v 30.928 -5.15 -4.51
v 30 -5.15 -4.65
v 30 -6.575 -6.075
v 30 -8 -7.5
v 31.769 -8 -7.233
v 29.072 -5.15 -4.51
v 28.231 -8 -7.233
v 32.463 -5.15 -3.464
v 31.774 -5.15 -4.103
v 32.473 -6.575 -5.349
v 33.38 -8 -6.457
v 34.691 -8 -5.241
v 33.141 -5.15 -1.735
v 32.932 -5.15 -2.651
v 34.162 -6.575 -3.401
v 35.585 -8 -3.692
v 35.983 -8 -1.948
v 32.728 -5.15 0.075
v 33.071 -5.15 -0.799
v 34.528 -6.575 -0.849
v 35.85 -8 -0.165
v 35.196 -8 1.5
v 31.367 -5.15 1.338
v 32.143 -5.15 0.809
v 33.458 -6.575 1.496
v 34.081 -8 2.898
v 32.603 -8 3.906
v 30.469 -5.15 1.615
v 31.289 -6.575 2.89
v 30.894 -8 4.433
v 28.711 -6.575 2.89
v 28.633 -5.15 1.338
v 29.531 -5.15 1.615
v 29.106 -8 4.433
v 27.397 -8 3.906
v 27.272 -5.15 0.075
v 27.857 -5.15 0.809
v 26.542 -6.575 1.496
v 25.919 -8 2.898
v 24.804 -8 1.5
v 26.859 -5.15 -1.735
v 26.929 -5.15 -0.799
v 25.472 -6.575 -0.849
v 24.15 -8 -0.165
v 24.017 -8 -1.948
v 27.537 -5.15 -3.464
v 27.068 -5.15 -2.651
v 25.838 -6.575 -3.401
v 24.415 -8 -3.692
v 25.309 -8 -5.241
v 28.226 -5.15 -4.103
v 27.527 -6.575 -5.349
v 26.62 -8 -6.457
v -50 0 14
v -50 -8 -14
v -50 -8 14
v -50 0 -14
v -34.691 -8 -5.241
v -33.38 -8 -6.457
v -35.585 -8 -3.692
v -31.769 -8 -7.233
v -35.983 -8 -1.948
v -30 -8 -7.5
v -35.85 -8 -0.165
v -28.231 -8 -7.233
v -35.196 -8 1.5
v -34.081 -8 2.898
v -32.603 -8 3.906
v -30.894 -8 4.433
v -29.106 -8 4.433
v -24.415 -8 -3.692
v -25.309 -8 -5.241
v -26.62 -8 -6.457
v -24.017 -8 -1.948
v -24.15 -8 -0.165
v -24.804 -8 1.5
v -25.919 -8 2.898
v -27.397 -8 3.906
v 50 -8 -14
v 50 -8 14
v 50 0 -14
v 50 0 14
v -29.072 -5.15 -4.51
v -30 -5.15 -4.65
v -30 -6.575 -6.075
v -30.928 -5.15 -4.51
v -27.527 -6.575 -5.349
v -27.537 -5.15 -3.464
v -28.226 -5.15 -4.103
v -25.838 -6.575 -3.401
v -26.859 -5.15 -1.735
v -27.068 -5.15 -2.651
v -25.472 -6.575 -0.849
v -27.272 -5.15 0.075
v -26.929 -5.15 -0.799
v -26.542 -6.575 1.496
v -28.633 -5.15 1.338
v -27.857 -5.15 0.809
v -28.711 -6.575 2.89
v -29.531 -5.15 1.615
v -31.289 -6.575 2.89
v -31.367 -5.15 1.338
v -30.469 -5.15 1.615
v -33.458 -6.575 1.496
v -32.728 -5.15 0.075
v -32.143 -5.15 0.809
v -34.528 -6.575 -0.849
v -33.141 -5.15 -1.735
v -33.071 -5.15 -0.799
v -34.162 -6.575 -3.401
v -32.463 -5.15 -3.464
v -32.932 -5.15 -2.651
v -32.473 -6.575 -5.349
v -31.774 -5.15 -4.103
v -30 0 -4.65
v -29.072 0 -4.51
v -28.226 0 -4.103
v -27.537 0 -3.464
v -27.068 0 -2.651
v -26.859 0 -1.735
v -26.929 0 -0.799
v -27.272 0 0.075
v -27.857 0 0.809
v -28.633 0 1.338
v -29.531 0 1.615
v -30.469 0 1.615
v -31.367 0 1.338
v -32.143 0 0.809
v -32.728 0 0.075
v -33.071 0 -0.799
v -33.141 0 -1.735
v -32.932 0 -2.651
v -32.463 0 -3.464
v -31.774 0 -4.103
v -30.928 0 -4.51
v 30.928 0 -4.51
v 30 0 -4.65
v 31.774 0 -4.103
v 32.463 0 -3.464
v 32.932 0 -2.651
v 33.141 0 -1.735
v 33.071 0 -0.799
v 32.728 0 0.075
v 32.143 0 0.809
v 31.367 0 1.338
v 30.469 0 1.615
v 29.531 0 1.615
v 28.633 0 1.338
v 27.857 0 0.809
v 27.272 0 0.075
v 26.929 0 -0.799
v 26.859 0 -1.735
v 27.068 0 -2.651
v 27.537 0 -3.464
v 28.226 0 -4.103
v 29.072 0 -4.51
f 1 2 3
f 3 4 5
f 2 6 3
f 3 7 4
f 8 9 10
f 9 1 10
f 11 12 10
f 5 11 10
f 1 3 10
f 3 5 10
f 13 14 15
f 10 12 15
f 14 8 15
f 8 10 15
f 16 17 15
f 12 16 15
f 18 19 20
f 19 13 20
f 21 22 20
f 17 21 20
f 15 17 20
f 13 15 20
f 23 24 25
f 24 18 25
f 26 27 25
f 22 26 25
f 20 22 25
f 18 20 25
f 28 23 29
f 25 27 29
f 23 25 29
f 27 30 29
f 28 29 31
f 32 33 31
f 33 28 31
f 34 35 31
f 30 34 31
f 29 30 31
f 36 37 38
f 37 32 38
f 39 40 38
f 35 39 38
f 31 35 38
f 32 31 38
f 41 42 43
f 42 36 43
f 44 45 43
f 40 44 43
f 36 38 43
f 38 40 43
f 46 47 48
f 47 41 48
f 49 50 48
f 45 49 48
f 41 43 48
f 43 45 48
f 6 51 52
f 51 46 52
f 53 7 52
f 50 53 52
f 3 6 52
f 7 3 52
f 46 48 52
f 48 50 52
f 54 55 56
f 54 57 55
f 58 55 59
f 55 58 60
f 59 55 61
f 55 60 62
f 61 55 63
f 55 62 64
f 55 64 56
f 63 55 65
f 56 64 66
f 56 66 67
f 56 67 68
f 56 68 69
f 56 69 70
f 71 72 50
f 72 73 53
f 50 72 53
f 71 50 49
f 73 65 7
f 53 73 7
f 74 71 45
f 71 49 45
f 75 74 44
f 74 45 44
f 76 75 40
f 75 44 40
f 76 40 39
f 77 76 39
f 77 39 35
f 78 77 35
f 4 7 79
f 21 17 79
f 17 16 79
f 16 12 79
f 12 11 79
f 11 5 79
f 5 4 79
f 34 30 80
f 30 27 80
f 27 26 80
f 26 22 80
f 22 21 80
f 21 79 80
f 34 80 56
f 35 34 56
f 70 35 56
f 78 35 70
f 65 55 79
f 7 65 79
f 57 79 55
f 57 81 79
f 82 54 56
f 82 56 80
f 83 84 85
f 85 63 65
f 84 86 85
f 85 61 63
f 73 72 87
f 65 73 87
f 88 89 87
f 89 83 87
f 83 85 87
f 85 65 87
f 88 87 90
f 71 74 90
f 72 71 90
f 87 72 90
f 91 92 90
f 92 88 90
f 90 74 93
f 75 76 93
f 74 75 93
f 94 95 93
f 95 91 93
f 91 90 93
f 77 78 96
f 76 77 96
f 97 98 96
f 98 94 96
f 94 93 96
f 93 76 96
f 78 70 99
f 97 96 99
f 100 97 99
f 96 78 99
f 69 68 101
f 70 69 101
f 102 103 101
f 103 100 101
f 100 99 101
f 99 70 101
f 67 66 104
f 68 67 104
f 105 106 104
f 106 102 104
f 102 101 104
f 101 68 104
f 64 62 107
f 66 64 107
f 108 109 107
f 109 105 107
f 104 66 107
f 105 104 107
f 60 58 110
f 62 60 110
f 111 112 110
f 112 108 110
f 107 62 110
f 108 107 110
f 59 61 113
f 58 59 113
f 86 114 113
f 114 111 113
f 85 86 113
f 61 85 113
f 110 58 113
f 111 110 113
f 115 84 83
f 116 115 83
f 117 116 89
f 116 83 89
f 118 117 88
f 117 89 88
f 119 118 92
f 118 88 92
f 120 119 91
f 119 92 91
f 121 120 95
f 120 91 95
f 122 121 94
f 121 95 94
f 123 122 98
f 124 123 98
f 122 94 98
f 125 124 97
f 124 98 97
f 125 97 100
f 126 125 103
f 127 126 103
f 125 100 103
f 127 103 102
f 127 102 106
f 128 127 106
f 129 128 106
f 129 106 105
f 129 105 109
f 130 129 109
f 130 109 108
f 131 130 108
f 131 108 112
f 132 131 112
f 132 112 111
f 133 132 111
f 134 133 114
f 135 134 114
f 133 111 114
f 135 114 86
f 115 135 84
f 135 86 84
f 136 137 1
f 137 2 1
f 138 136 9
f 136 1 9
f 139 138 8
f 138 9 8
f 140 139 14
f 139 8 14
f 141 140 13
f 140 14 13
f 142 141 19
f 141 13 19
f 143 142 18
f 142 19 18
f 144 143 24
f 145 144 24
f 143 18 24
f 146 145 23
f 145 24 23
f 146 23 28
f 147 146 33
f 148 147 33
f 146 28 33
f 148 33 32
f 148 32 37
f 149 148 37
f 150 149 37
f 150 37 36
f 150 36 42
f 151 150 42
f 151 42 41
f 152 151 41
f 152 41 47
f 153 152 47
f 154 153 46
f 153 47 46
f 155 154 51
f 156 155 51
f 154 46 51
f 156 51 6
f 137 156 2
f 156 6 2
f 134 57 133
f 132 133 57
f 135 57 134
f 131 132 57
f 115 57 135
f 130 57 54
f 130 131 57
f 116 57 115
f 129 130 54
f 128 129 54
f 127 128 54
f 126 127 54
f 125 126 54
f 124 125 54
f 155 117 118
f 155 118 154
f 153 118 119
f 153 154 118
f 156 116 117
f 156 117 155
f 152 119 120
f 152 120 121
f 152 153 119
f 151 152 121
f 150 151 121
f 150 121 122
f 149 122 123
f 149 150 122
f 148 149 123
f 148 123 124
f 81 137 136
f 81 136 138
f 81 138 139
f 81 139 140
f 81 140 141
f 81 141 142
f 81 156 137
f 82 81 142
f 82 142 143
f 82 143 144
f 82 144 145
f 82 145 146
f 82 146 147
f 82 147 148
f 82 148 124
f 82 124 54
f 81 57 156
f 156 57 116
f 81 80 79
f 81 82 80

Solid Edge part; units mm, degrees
sketch "Sketch1" plane through (0, 0, 0) normal (0, -1, 0) x (1, 0, 0)
  line L0 (-50, 14) -> (50, 14)
  line L1 (50, 14) -> (50, -14)
  line L2 (50, -14) -> (-50, -14)
  line L3 (-50, -14) -> (-50, 14)
  dimension "D1" = 28
  dimension "D2" = 100
extrude "Protrusion1" add sketch "Sketch1" along normal blind 8
hole "Hole_3" at (30, -8, -1.5) direction (0, 1, 0) diameter 6.3 end up to next countersink diameter 12 countersink angle 90
hole "Hole1" at (-30, -8, -1.5) direction (0, 1, 0) diameter 6.3 end up to next countersink diameter 12 countersink angle 90
properties part number "3" material "cast iron"
